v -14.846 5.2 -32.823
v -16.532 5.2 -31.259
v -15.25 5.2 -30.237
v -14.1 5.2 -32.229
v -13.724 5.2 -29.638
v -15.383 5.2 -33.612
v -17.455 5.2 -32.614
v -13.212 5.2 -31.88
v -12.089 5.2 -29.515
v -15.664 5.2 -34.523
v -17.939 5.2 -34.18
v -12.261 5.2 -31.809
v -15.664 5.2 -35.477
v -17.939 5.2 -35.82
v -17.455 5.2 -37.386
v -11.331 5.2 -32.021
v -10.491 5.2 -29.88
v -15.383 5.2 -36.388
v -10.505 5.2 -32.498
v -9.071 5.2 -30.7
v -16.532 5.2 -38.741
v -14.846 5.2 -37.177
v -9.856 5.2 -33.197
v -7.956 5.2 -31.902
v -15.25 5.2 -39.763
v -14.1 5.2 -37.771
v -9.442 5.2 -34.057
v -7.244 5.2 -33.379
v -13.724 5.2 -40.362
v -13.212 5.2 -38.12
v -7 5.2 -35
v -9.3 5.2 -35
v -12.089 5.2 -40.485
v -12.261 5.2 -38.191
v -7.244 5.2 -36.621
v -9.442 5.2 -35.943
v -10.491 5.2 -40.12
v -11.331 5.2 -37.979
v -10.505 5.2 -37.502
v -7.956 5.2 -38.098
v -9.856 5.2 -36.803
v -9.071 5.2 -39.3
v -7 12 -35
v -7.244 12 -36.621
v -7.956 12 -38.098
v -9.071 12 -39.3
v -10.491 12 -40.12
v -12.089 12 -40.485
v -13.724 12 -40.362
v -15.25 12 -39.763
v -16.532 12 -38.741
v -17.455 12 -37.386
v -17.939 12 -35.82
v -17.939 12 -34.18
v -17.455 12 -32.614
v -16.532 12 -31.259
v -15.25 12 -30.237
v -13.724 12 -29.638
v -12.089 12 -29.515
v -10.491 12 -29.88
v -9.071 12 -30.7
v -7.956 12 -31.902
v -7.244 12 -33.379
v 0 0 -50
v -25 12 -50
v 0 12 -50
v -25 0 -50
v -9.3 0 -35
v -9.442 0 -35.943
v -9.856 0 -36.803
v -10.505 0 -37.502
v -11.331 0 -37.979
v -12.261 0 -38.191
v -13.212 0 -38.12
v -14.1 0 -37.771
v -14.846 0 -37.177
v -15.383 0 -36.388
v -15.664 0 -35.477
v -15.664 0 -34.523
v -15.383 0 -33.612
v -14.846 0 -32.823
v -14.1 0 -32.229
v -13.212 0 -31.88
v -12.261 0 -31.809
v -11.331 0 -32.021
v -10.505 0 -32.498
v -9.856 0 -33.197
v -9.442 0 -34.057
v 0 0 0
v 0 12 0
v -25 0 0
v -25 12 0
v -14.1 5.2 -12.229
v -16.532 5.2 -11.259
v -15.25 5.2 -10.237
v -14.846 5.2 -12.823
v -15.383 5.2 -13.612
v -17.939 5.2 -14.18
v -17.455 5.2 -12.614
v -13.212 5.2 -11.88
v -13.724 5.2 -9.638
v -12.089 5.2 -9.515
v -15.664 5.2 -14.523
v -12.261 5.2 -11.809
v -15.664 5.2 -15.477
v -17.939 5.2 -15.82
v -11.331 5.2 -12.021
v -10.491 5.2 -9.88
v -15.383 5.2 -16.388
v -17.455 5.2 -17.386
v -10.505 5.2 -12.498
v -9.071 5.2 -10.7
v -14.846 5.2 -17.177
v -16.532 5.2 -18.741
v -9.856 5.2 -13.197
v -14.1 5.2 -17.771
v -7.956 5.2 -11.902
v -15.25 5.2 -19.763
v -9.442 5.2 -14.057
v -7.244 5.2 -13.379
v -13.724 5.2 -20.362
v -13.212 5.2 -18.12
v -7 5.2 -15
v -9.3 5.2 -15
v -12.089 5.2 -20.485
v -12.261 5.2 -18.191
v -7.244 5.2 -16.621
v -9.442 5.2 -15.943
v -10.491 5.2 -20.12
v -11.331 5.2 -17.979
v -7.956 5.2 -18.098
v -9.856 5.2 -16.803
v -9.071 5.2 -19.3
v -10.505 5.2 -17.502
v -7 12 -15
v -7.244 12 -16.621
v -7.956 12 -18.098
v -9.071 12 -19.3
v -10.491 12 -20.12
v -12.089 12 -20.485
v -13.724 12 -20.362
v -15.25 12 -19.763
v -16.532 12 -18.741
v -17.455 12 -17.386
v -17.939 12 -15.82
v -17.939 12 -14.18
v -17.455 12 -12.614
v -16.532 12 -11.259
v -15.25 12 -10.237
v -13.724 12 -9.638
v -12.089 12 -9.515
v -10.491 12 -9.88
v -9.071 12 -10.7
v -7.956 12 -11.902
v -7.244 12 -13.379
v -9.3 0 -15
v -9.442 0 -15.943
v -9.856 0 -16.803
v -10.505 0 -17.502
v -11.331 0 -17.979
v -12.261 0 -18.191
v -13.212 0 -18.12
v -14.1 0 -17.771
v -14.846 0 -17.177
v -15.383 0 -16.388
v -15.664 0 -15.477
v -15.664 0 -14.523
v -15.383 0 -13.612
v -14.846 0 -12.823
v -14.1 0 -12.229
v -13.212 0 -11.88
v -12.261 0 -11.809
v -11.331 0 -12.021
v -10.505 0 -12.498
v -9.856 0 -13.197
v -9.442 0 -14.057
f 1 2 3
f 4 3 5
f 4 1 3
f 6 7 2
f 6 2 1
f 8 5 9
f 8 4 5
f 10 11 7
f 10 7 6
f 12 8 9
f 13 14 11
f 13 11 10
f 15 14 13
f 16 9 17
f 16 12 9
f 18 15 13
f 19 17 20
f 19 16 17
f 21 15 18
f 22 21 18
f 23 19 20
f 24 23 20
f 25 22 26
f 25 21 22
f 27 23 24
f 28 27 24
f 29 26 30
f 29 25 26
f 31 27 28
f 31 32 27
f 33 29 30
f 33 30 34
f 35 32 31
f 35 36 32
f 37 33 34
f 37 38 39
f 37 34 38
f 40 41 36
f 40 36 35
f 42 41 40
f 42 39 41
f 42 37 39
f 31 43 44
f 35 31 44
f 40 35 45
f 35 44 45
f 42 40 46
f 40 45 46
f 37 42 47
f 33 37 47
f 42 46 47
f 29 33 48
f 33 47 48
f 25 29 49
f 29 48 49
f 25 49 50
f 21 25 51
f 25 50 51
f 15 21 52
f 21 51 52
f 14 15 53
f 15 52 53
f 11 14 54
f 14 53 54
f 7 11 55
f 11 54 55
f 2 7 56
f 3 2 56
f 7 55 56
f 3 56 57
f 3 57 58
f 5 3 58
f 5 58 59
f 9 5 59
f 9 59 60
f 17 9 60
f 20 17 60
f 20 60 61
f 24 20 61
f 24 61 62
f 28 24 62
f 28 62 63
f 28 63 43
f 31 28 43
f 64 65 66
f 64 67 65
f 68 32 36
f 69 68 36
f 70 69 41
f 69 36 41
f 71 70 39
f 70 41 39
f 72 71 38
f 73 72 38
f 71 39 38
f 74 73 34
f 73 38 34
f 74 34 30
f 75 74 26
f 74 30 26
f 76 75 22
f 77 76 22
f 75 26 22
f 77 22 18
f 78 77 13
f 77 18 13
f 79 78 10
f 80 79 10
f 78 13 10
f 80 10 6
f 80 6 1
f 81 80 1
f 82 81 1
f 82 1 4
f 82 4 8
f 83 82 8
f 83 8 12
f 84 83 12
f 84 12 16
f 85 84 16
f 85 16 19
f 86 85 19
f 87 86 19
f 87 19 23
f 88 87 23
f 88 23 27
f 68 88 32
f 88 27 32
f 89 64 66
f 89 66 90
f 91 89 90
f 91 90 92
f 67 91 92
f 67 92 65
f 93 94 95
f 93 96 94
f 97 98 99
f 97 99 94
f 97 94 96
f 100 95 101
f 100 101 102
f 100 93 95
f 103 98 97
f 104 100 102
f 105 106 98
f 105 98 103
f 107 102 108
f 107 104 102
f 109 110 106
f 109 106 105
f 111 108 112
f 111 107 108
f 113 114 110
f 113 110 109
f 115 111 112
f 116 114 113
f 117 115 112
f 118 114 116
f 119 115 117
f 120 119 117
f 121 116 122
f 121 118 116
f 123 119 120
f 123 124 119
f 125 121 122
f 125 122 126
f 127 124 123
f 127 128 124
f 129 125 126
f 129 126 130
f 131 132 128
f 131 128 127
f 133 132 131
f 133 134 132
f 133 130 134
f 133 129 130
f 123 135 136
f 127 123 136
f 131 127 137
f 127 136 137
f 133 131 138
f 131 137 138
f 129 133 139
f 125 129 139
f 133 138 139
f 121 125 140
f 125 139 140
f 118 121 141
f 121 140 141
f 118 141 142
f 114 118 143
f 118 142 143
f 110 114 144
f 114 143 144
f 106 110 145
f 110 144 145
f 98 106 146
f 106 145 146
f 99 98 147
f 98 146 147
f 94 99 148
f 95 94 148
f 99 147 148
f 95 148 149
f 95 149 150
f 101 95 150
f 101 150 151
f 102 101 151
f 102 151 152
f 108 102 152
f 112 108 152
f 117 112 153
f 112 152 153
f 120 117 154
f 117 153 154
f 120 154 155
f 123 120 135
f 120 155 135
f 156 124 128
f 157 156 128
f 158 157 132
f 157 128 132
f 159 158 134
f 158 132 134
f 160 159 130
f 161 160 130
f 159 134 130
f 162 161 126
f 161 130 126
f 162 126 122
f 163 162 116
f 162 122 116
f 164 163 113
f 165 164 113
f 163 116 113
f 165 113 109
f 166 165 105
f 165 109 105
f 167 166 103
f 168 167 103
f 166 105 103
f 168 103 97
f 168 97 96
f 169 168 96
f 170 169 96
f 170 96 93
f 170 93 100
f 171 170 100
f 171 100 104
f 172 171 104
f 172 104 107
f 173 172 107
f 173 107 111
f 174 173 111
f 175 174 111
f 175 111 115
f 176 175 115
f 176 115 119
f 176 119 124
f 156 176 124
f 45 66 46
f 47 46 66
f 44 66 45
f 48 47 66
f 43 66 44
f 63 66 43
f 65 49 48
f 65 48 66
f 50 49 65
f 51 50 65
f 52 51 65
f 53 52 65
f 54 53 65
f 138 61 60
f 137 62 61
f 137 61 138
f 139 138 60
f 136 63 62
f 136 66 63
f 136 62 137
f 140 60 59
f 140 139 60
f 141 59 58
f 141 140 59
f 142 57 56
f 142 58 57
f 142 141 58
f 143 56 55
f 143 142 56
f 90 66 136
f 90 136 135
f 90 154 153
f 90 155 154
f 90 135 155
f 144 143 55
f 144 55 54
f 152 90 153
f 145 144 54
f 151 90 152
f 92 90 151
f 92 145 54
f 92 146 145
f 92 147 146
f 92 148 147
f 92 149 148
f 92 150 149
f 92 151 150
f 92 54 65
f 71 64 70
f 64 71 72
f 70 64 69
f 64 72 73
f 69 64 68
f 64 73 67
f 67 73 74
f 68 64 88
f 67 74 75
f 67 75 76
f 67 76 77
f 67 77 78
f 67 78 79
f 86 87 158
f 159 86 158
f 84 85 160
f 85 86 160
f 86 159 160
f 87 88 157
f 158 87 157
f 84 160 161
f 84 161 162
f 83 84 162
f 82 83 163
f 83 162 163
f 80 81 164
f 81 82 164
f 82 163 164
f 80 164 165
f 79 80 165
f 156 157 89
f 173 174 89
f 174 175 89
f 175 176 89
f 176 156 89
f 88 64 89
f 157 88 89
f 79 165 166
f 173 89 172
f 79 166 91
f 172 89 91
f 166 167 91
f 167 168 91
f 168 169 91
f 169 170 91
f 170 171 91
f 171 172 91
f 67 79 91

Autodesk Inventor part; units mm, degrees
ref_plane "YZ Plane" through (0, 0, 0) normal (1, 0, 0) x (0, 1, 0)
ref_plane "XZ Plane" through (0, 0, 0) normal (0, 1, 0) x (-1, 0, 0)
ref_plane "XY Plane" through (0, 0, 0) normal (0, 0, 1) x (1, 0, 0)
sketch "Sketch1" plane through (0, 0, 0) normal (0, 1, 0) x (-1, 0, 0)
  line L0 (0, 0) -> (25, 0)
  line L1 (25, 0) -> (25, -50)
  line L2 (25, -50) -> (0, -50)
  line L3 (0, -50) -> (0, 0)
  dimension "d0" = 25
  dimension "d1" = 50
extrude "Extrusion1" add sketch "Sketch1" along normal blind 12
sketch "Sketch2" plane through (0, 12, 0) normal (0, 1, 0) x (1, 0, 0)
  circle A0 centre (-12.5, 15) radius 3.2
  circle A1 centre (-12.5, 35) radius 3.2
  line L0 (-25, 0) -> (0, 0) projected
  line L1 (0, 0) -> (0, 50) projected
  dimension "d4" = 6.4
  dimension "d5" = 20
  dimension "d6" = 15
  dimension "d7" = 12.5
extrude "Extrusion2" cut sketch "Sketch2" against normal through all
sketch "Sketch3" plane through (0, 12, 0) normal (0, 1, 0) x (1, 0, 0)
  circle A0 centre (-12.5, 15) radius 3.2 projected
  circle A1 centre (-12.5, 15) radius 5.5
  circle A2 centre (-12.5, 35) radius 3.2 projected
  circle A3 centre (-12.5, 35) radius 5.5
  point P0 (0, 0)
  dimension "d10" = 11
extrude "Extrusion3" cut sketch "Sketch3" against normal blind 6.8 contours A0 | A1 | A2 | A3
